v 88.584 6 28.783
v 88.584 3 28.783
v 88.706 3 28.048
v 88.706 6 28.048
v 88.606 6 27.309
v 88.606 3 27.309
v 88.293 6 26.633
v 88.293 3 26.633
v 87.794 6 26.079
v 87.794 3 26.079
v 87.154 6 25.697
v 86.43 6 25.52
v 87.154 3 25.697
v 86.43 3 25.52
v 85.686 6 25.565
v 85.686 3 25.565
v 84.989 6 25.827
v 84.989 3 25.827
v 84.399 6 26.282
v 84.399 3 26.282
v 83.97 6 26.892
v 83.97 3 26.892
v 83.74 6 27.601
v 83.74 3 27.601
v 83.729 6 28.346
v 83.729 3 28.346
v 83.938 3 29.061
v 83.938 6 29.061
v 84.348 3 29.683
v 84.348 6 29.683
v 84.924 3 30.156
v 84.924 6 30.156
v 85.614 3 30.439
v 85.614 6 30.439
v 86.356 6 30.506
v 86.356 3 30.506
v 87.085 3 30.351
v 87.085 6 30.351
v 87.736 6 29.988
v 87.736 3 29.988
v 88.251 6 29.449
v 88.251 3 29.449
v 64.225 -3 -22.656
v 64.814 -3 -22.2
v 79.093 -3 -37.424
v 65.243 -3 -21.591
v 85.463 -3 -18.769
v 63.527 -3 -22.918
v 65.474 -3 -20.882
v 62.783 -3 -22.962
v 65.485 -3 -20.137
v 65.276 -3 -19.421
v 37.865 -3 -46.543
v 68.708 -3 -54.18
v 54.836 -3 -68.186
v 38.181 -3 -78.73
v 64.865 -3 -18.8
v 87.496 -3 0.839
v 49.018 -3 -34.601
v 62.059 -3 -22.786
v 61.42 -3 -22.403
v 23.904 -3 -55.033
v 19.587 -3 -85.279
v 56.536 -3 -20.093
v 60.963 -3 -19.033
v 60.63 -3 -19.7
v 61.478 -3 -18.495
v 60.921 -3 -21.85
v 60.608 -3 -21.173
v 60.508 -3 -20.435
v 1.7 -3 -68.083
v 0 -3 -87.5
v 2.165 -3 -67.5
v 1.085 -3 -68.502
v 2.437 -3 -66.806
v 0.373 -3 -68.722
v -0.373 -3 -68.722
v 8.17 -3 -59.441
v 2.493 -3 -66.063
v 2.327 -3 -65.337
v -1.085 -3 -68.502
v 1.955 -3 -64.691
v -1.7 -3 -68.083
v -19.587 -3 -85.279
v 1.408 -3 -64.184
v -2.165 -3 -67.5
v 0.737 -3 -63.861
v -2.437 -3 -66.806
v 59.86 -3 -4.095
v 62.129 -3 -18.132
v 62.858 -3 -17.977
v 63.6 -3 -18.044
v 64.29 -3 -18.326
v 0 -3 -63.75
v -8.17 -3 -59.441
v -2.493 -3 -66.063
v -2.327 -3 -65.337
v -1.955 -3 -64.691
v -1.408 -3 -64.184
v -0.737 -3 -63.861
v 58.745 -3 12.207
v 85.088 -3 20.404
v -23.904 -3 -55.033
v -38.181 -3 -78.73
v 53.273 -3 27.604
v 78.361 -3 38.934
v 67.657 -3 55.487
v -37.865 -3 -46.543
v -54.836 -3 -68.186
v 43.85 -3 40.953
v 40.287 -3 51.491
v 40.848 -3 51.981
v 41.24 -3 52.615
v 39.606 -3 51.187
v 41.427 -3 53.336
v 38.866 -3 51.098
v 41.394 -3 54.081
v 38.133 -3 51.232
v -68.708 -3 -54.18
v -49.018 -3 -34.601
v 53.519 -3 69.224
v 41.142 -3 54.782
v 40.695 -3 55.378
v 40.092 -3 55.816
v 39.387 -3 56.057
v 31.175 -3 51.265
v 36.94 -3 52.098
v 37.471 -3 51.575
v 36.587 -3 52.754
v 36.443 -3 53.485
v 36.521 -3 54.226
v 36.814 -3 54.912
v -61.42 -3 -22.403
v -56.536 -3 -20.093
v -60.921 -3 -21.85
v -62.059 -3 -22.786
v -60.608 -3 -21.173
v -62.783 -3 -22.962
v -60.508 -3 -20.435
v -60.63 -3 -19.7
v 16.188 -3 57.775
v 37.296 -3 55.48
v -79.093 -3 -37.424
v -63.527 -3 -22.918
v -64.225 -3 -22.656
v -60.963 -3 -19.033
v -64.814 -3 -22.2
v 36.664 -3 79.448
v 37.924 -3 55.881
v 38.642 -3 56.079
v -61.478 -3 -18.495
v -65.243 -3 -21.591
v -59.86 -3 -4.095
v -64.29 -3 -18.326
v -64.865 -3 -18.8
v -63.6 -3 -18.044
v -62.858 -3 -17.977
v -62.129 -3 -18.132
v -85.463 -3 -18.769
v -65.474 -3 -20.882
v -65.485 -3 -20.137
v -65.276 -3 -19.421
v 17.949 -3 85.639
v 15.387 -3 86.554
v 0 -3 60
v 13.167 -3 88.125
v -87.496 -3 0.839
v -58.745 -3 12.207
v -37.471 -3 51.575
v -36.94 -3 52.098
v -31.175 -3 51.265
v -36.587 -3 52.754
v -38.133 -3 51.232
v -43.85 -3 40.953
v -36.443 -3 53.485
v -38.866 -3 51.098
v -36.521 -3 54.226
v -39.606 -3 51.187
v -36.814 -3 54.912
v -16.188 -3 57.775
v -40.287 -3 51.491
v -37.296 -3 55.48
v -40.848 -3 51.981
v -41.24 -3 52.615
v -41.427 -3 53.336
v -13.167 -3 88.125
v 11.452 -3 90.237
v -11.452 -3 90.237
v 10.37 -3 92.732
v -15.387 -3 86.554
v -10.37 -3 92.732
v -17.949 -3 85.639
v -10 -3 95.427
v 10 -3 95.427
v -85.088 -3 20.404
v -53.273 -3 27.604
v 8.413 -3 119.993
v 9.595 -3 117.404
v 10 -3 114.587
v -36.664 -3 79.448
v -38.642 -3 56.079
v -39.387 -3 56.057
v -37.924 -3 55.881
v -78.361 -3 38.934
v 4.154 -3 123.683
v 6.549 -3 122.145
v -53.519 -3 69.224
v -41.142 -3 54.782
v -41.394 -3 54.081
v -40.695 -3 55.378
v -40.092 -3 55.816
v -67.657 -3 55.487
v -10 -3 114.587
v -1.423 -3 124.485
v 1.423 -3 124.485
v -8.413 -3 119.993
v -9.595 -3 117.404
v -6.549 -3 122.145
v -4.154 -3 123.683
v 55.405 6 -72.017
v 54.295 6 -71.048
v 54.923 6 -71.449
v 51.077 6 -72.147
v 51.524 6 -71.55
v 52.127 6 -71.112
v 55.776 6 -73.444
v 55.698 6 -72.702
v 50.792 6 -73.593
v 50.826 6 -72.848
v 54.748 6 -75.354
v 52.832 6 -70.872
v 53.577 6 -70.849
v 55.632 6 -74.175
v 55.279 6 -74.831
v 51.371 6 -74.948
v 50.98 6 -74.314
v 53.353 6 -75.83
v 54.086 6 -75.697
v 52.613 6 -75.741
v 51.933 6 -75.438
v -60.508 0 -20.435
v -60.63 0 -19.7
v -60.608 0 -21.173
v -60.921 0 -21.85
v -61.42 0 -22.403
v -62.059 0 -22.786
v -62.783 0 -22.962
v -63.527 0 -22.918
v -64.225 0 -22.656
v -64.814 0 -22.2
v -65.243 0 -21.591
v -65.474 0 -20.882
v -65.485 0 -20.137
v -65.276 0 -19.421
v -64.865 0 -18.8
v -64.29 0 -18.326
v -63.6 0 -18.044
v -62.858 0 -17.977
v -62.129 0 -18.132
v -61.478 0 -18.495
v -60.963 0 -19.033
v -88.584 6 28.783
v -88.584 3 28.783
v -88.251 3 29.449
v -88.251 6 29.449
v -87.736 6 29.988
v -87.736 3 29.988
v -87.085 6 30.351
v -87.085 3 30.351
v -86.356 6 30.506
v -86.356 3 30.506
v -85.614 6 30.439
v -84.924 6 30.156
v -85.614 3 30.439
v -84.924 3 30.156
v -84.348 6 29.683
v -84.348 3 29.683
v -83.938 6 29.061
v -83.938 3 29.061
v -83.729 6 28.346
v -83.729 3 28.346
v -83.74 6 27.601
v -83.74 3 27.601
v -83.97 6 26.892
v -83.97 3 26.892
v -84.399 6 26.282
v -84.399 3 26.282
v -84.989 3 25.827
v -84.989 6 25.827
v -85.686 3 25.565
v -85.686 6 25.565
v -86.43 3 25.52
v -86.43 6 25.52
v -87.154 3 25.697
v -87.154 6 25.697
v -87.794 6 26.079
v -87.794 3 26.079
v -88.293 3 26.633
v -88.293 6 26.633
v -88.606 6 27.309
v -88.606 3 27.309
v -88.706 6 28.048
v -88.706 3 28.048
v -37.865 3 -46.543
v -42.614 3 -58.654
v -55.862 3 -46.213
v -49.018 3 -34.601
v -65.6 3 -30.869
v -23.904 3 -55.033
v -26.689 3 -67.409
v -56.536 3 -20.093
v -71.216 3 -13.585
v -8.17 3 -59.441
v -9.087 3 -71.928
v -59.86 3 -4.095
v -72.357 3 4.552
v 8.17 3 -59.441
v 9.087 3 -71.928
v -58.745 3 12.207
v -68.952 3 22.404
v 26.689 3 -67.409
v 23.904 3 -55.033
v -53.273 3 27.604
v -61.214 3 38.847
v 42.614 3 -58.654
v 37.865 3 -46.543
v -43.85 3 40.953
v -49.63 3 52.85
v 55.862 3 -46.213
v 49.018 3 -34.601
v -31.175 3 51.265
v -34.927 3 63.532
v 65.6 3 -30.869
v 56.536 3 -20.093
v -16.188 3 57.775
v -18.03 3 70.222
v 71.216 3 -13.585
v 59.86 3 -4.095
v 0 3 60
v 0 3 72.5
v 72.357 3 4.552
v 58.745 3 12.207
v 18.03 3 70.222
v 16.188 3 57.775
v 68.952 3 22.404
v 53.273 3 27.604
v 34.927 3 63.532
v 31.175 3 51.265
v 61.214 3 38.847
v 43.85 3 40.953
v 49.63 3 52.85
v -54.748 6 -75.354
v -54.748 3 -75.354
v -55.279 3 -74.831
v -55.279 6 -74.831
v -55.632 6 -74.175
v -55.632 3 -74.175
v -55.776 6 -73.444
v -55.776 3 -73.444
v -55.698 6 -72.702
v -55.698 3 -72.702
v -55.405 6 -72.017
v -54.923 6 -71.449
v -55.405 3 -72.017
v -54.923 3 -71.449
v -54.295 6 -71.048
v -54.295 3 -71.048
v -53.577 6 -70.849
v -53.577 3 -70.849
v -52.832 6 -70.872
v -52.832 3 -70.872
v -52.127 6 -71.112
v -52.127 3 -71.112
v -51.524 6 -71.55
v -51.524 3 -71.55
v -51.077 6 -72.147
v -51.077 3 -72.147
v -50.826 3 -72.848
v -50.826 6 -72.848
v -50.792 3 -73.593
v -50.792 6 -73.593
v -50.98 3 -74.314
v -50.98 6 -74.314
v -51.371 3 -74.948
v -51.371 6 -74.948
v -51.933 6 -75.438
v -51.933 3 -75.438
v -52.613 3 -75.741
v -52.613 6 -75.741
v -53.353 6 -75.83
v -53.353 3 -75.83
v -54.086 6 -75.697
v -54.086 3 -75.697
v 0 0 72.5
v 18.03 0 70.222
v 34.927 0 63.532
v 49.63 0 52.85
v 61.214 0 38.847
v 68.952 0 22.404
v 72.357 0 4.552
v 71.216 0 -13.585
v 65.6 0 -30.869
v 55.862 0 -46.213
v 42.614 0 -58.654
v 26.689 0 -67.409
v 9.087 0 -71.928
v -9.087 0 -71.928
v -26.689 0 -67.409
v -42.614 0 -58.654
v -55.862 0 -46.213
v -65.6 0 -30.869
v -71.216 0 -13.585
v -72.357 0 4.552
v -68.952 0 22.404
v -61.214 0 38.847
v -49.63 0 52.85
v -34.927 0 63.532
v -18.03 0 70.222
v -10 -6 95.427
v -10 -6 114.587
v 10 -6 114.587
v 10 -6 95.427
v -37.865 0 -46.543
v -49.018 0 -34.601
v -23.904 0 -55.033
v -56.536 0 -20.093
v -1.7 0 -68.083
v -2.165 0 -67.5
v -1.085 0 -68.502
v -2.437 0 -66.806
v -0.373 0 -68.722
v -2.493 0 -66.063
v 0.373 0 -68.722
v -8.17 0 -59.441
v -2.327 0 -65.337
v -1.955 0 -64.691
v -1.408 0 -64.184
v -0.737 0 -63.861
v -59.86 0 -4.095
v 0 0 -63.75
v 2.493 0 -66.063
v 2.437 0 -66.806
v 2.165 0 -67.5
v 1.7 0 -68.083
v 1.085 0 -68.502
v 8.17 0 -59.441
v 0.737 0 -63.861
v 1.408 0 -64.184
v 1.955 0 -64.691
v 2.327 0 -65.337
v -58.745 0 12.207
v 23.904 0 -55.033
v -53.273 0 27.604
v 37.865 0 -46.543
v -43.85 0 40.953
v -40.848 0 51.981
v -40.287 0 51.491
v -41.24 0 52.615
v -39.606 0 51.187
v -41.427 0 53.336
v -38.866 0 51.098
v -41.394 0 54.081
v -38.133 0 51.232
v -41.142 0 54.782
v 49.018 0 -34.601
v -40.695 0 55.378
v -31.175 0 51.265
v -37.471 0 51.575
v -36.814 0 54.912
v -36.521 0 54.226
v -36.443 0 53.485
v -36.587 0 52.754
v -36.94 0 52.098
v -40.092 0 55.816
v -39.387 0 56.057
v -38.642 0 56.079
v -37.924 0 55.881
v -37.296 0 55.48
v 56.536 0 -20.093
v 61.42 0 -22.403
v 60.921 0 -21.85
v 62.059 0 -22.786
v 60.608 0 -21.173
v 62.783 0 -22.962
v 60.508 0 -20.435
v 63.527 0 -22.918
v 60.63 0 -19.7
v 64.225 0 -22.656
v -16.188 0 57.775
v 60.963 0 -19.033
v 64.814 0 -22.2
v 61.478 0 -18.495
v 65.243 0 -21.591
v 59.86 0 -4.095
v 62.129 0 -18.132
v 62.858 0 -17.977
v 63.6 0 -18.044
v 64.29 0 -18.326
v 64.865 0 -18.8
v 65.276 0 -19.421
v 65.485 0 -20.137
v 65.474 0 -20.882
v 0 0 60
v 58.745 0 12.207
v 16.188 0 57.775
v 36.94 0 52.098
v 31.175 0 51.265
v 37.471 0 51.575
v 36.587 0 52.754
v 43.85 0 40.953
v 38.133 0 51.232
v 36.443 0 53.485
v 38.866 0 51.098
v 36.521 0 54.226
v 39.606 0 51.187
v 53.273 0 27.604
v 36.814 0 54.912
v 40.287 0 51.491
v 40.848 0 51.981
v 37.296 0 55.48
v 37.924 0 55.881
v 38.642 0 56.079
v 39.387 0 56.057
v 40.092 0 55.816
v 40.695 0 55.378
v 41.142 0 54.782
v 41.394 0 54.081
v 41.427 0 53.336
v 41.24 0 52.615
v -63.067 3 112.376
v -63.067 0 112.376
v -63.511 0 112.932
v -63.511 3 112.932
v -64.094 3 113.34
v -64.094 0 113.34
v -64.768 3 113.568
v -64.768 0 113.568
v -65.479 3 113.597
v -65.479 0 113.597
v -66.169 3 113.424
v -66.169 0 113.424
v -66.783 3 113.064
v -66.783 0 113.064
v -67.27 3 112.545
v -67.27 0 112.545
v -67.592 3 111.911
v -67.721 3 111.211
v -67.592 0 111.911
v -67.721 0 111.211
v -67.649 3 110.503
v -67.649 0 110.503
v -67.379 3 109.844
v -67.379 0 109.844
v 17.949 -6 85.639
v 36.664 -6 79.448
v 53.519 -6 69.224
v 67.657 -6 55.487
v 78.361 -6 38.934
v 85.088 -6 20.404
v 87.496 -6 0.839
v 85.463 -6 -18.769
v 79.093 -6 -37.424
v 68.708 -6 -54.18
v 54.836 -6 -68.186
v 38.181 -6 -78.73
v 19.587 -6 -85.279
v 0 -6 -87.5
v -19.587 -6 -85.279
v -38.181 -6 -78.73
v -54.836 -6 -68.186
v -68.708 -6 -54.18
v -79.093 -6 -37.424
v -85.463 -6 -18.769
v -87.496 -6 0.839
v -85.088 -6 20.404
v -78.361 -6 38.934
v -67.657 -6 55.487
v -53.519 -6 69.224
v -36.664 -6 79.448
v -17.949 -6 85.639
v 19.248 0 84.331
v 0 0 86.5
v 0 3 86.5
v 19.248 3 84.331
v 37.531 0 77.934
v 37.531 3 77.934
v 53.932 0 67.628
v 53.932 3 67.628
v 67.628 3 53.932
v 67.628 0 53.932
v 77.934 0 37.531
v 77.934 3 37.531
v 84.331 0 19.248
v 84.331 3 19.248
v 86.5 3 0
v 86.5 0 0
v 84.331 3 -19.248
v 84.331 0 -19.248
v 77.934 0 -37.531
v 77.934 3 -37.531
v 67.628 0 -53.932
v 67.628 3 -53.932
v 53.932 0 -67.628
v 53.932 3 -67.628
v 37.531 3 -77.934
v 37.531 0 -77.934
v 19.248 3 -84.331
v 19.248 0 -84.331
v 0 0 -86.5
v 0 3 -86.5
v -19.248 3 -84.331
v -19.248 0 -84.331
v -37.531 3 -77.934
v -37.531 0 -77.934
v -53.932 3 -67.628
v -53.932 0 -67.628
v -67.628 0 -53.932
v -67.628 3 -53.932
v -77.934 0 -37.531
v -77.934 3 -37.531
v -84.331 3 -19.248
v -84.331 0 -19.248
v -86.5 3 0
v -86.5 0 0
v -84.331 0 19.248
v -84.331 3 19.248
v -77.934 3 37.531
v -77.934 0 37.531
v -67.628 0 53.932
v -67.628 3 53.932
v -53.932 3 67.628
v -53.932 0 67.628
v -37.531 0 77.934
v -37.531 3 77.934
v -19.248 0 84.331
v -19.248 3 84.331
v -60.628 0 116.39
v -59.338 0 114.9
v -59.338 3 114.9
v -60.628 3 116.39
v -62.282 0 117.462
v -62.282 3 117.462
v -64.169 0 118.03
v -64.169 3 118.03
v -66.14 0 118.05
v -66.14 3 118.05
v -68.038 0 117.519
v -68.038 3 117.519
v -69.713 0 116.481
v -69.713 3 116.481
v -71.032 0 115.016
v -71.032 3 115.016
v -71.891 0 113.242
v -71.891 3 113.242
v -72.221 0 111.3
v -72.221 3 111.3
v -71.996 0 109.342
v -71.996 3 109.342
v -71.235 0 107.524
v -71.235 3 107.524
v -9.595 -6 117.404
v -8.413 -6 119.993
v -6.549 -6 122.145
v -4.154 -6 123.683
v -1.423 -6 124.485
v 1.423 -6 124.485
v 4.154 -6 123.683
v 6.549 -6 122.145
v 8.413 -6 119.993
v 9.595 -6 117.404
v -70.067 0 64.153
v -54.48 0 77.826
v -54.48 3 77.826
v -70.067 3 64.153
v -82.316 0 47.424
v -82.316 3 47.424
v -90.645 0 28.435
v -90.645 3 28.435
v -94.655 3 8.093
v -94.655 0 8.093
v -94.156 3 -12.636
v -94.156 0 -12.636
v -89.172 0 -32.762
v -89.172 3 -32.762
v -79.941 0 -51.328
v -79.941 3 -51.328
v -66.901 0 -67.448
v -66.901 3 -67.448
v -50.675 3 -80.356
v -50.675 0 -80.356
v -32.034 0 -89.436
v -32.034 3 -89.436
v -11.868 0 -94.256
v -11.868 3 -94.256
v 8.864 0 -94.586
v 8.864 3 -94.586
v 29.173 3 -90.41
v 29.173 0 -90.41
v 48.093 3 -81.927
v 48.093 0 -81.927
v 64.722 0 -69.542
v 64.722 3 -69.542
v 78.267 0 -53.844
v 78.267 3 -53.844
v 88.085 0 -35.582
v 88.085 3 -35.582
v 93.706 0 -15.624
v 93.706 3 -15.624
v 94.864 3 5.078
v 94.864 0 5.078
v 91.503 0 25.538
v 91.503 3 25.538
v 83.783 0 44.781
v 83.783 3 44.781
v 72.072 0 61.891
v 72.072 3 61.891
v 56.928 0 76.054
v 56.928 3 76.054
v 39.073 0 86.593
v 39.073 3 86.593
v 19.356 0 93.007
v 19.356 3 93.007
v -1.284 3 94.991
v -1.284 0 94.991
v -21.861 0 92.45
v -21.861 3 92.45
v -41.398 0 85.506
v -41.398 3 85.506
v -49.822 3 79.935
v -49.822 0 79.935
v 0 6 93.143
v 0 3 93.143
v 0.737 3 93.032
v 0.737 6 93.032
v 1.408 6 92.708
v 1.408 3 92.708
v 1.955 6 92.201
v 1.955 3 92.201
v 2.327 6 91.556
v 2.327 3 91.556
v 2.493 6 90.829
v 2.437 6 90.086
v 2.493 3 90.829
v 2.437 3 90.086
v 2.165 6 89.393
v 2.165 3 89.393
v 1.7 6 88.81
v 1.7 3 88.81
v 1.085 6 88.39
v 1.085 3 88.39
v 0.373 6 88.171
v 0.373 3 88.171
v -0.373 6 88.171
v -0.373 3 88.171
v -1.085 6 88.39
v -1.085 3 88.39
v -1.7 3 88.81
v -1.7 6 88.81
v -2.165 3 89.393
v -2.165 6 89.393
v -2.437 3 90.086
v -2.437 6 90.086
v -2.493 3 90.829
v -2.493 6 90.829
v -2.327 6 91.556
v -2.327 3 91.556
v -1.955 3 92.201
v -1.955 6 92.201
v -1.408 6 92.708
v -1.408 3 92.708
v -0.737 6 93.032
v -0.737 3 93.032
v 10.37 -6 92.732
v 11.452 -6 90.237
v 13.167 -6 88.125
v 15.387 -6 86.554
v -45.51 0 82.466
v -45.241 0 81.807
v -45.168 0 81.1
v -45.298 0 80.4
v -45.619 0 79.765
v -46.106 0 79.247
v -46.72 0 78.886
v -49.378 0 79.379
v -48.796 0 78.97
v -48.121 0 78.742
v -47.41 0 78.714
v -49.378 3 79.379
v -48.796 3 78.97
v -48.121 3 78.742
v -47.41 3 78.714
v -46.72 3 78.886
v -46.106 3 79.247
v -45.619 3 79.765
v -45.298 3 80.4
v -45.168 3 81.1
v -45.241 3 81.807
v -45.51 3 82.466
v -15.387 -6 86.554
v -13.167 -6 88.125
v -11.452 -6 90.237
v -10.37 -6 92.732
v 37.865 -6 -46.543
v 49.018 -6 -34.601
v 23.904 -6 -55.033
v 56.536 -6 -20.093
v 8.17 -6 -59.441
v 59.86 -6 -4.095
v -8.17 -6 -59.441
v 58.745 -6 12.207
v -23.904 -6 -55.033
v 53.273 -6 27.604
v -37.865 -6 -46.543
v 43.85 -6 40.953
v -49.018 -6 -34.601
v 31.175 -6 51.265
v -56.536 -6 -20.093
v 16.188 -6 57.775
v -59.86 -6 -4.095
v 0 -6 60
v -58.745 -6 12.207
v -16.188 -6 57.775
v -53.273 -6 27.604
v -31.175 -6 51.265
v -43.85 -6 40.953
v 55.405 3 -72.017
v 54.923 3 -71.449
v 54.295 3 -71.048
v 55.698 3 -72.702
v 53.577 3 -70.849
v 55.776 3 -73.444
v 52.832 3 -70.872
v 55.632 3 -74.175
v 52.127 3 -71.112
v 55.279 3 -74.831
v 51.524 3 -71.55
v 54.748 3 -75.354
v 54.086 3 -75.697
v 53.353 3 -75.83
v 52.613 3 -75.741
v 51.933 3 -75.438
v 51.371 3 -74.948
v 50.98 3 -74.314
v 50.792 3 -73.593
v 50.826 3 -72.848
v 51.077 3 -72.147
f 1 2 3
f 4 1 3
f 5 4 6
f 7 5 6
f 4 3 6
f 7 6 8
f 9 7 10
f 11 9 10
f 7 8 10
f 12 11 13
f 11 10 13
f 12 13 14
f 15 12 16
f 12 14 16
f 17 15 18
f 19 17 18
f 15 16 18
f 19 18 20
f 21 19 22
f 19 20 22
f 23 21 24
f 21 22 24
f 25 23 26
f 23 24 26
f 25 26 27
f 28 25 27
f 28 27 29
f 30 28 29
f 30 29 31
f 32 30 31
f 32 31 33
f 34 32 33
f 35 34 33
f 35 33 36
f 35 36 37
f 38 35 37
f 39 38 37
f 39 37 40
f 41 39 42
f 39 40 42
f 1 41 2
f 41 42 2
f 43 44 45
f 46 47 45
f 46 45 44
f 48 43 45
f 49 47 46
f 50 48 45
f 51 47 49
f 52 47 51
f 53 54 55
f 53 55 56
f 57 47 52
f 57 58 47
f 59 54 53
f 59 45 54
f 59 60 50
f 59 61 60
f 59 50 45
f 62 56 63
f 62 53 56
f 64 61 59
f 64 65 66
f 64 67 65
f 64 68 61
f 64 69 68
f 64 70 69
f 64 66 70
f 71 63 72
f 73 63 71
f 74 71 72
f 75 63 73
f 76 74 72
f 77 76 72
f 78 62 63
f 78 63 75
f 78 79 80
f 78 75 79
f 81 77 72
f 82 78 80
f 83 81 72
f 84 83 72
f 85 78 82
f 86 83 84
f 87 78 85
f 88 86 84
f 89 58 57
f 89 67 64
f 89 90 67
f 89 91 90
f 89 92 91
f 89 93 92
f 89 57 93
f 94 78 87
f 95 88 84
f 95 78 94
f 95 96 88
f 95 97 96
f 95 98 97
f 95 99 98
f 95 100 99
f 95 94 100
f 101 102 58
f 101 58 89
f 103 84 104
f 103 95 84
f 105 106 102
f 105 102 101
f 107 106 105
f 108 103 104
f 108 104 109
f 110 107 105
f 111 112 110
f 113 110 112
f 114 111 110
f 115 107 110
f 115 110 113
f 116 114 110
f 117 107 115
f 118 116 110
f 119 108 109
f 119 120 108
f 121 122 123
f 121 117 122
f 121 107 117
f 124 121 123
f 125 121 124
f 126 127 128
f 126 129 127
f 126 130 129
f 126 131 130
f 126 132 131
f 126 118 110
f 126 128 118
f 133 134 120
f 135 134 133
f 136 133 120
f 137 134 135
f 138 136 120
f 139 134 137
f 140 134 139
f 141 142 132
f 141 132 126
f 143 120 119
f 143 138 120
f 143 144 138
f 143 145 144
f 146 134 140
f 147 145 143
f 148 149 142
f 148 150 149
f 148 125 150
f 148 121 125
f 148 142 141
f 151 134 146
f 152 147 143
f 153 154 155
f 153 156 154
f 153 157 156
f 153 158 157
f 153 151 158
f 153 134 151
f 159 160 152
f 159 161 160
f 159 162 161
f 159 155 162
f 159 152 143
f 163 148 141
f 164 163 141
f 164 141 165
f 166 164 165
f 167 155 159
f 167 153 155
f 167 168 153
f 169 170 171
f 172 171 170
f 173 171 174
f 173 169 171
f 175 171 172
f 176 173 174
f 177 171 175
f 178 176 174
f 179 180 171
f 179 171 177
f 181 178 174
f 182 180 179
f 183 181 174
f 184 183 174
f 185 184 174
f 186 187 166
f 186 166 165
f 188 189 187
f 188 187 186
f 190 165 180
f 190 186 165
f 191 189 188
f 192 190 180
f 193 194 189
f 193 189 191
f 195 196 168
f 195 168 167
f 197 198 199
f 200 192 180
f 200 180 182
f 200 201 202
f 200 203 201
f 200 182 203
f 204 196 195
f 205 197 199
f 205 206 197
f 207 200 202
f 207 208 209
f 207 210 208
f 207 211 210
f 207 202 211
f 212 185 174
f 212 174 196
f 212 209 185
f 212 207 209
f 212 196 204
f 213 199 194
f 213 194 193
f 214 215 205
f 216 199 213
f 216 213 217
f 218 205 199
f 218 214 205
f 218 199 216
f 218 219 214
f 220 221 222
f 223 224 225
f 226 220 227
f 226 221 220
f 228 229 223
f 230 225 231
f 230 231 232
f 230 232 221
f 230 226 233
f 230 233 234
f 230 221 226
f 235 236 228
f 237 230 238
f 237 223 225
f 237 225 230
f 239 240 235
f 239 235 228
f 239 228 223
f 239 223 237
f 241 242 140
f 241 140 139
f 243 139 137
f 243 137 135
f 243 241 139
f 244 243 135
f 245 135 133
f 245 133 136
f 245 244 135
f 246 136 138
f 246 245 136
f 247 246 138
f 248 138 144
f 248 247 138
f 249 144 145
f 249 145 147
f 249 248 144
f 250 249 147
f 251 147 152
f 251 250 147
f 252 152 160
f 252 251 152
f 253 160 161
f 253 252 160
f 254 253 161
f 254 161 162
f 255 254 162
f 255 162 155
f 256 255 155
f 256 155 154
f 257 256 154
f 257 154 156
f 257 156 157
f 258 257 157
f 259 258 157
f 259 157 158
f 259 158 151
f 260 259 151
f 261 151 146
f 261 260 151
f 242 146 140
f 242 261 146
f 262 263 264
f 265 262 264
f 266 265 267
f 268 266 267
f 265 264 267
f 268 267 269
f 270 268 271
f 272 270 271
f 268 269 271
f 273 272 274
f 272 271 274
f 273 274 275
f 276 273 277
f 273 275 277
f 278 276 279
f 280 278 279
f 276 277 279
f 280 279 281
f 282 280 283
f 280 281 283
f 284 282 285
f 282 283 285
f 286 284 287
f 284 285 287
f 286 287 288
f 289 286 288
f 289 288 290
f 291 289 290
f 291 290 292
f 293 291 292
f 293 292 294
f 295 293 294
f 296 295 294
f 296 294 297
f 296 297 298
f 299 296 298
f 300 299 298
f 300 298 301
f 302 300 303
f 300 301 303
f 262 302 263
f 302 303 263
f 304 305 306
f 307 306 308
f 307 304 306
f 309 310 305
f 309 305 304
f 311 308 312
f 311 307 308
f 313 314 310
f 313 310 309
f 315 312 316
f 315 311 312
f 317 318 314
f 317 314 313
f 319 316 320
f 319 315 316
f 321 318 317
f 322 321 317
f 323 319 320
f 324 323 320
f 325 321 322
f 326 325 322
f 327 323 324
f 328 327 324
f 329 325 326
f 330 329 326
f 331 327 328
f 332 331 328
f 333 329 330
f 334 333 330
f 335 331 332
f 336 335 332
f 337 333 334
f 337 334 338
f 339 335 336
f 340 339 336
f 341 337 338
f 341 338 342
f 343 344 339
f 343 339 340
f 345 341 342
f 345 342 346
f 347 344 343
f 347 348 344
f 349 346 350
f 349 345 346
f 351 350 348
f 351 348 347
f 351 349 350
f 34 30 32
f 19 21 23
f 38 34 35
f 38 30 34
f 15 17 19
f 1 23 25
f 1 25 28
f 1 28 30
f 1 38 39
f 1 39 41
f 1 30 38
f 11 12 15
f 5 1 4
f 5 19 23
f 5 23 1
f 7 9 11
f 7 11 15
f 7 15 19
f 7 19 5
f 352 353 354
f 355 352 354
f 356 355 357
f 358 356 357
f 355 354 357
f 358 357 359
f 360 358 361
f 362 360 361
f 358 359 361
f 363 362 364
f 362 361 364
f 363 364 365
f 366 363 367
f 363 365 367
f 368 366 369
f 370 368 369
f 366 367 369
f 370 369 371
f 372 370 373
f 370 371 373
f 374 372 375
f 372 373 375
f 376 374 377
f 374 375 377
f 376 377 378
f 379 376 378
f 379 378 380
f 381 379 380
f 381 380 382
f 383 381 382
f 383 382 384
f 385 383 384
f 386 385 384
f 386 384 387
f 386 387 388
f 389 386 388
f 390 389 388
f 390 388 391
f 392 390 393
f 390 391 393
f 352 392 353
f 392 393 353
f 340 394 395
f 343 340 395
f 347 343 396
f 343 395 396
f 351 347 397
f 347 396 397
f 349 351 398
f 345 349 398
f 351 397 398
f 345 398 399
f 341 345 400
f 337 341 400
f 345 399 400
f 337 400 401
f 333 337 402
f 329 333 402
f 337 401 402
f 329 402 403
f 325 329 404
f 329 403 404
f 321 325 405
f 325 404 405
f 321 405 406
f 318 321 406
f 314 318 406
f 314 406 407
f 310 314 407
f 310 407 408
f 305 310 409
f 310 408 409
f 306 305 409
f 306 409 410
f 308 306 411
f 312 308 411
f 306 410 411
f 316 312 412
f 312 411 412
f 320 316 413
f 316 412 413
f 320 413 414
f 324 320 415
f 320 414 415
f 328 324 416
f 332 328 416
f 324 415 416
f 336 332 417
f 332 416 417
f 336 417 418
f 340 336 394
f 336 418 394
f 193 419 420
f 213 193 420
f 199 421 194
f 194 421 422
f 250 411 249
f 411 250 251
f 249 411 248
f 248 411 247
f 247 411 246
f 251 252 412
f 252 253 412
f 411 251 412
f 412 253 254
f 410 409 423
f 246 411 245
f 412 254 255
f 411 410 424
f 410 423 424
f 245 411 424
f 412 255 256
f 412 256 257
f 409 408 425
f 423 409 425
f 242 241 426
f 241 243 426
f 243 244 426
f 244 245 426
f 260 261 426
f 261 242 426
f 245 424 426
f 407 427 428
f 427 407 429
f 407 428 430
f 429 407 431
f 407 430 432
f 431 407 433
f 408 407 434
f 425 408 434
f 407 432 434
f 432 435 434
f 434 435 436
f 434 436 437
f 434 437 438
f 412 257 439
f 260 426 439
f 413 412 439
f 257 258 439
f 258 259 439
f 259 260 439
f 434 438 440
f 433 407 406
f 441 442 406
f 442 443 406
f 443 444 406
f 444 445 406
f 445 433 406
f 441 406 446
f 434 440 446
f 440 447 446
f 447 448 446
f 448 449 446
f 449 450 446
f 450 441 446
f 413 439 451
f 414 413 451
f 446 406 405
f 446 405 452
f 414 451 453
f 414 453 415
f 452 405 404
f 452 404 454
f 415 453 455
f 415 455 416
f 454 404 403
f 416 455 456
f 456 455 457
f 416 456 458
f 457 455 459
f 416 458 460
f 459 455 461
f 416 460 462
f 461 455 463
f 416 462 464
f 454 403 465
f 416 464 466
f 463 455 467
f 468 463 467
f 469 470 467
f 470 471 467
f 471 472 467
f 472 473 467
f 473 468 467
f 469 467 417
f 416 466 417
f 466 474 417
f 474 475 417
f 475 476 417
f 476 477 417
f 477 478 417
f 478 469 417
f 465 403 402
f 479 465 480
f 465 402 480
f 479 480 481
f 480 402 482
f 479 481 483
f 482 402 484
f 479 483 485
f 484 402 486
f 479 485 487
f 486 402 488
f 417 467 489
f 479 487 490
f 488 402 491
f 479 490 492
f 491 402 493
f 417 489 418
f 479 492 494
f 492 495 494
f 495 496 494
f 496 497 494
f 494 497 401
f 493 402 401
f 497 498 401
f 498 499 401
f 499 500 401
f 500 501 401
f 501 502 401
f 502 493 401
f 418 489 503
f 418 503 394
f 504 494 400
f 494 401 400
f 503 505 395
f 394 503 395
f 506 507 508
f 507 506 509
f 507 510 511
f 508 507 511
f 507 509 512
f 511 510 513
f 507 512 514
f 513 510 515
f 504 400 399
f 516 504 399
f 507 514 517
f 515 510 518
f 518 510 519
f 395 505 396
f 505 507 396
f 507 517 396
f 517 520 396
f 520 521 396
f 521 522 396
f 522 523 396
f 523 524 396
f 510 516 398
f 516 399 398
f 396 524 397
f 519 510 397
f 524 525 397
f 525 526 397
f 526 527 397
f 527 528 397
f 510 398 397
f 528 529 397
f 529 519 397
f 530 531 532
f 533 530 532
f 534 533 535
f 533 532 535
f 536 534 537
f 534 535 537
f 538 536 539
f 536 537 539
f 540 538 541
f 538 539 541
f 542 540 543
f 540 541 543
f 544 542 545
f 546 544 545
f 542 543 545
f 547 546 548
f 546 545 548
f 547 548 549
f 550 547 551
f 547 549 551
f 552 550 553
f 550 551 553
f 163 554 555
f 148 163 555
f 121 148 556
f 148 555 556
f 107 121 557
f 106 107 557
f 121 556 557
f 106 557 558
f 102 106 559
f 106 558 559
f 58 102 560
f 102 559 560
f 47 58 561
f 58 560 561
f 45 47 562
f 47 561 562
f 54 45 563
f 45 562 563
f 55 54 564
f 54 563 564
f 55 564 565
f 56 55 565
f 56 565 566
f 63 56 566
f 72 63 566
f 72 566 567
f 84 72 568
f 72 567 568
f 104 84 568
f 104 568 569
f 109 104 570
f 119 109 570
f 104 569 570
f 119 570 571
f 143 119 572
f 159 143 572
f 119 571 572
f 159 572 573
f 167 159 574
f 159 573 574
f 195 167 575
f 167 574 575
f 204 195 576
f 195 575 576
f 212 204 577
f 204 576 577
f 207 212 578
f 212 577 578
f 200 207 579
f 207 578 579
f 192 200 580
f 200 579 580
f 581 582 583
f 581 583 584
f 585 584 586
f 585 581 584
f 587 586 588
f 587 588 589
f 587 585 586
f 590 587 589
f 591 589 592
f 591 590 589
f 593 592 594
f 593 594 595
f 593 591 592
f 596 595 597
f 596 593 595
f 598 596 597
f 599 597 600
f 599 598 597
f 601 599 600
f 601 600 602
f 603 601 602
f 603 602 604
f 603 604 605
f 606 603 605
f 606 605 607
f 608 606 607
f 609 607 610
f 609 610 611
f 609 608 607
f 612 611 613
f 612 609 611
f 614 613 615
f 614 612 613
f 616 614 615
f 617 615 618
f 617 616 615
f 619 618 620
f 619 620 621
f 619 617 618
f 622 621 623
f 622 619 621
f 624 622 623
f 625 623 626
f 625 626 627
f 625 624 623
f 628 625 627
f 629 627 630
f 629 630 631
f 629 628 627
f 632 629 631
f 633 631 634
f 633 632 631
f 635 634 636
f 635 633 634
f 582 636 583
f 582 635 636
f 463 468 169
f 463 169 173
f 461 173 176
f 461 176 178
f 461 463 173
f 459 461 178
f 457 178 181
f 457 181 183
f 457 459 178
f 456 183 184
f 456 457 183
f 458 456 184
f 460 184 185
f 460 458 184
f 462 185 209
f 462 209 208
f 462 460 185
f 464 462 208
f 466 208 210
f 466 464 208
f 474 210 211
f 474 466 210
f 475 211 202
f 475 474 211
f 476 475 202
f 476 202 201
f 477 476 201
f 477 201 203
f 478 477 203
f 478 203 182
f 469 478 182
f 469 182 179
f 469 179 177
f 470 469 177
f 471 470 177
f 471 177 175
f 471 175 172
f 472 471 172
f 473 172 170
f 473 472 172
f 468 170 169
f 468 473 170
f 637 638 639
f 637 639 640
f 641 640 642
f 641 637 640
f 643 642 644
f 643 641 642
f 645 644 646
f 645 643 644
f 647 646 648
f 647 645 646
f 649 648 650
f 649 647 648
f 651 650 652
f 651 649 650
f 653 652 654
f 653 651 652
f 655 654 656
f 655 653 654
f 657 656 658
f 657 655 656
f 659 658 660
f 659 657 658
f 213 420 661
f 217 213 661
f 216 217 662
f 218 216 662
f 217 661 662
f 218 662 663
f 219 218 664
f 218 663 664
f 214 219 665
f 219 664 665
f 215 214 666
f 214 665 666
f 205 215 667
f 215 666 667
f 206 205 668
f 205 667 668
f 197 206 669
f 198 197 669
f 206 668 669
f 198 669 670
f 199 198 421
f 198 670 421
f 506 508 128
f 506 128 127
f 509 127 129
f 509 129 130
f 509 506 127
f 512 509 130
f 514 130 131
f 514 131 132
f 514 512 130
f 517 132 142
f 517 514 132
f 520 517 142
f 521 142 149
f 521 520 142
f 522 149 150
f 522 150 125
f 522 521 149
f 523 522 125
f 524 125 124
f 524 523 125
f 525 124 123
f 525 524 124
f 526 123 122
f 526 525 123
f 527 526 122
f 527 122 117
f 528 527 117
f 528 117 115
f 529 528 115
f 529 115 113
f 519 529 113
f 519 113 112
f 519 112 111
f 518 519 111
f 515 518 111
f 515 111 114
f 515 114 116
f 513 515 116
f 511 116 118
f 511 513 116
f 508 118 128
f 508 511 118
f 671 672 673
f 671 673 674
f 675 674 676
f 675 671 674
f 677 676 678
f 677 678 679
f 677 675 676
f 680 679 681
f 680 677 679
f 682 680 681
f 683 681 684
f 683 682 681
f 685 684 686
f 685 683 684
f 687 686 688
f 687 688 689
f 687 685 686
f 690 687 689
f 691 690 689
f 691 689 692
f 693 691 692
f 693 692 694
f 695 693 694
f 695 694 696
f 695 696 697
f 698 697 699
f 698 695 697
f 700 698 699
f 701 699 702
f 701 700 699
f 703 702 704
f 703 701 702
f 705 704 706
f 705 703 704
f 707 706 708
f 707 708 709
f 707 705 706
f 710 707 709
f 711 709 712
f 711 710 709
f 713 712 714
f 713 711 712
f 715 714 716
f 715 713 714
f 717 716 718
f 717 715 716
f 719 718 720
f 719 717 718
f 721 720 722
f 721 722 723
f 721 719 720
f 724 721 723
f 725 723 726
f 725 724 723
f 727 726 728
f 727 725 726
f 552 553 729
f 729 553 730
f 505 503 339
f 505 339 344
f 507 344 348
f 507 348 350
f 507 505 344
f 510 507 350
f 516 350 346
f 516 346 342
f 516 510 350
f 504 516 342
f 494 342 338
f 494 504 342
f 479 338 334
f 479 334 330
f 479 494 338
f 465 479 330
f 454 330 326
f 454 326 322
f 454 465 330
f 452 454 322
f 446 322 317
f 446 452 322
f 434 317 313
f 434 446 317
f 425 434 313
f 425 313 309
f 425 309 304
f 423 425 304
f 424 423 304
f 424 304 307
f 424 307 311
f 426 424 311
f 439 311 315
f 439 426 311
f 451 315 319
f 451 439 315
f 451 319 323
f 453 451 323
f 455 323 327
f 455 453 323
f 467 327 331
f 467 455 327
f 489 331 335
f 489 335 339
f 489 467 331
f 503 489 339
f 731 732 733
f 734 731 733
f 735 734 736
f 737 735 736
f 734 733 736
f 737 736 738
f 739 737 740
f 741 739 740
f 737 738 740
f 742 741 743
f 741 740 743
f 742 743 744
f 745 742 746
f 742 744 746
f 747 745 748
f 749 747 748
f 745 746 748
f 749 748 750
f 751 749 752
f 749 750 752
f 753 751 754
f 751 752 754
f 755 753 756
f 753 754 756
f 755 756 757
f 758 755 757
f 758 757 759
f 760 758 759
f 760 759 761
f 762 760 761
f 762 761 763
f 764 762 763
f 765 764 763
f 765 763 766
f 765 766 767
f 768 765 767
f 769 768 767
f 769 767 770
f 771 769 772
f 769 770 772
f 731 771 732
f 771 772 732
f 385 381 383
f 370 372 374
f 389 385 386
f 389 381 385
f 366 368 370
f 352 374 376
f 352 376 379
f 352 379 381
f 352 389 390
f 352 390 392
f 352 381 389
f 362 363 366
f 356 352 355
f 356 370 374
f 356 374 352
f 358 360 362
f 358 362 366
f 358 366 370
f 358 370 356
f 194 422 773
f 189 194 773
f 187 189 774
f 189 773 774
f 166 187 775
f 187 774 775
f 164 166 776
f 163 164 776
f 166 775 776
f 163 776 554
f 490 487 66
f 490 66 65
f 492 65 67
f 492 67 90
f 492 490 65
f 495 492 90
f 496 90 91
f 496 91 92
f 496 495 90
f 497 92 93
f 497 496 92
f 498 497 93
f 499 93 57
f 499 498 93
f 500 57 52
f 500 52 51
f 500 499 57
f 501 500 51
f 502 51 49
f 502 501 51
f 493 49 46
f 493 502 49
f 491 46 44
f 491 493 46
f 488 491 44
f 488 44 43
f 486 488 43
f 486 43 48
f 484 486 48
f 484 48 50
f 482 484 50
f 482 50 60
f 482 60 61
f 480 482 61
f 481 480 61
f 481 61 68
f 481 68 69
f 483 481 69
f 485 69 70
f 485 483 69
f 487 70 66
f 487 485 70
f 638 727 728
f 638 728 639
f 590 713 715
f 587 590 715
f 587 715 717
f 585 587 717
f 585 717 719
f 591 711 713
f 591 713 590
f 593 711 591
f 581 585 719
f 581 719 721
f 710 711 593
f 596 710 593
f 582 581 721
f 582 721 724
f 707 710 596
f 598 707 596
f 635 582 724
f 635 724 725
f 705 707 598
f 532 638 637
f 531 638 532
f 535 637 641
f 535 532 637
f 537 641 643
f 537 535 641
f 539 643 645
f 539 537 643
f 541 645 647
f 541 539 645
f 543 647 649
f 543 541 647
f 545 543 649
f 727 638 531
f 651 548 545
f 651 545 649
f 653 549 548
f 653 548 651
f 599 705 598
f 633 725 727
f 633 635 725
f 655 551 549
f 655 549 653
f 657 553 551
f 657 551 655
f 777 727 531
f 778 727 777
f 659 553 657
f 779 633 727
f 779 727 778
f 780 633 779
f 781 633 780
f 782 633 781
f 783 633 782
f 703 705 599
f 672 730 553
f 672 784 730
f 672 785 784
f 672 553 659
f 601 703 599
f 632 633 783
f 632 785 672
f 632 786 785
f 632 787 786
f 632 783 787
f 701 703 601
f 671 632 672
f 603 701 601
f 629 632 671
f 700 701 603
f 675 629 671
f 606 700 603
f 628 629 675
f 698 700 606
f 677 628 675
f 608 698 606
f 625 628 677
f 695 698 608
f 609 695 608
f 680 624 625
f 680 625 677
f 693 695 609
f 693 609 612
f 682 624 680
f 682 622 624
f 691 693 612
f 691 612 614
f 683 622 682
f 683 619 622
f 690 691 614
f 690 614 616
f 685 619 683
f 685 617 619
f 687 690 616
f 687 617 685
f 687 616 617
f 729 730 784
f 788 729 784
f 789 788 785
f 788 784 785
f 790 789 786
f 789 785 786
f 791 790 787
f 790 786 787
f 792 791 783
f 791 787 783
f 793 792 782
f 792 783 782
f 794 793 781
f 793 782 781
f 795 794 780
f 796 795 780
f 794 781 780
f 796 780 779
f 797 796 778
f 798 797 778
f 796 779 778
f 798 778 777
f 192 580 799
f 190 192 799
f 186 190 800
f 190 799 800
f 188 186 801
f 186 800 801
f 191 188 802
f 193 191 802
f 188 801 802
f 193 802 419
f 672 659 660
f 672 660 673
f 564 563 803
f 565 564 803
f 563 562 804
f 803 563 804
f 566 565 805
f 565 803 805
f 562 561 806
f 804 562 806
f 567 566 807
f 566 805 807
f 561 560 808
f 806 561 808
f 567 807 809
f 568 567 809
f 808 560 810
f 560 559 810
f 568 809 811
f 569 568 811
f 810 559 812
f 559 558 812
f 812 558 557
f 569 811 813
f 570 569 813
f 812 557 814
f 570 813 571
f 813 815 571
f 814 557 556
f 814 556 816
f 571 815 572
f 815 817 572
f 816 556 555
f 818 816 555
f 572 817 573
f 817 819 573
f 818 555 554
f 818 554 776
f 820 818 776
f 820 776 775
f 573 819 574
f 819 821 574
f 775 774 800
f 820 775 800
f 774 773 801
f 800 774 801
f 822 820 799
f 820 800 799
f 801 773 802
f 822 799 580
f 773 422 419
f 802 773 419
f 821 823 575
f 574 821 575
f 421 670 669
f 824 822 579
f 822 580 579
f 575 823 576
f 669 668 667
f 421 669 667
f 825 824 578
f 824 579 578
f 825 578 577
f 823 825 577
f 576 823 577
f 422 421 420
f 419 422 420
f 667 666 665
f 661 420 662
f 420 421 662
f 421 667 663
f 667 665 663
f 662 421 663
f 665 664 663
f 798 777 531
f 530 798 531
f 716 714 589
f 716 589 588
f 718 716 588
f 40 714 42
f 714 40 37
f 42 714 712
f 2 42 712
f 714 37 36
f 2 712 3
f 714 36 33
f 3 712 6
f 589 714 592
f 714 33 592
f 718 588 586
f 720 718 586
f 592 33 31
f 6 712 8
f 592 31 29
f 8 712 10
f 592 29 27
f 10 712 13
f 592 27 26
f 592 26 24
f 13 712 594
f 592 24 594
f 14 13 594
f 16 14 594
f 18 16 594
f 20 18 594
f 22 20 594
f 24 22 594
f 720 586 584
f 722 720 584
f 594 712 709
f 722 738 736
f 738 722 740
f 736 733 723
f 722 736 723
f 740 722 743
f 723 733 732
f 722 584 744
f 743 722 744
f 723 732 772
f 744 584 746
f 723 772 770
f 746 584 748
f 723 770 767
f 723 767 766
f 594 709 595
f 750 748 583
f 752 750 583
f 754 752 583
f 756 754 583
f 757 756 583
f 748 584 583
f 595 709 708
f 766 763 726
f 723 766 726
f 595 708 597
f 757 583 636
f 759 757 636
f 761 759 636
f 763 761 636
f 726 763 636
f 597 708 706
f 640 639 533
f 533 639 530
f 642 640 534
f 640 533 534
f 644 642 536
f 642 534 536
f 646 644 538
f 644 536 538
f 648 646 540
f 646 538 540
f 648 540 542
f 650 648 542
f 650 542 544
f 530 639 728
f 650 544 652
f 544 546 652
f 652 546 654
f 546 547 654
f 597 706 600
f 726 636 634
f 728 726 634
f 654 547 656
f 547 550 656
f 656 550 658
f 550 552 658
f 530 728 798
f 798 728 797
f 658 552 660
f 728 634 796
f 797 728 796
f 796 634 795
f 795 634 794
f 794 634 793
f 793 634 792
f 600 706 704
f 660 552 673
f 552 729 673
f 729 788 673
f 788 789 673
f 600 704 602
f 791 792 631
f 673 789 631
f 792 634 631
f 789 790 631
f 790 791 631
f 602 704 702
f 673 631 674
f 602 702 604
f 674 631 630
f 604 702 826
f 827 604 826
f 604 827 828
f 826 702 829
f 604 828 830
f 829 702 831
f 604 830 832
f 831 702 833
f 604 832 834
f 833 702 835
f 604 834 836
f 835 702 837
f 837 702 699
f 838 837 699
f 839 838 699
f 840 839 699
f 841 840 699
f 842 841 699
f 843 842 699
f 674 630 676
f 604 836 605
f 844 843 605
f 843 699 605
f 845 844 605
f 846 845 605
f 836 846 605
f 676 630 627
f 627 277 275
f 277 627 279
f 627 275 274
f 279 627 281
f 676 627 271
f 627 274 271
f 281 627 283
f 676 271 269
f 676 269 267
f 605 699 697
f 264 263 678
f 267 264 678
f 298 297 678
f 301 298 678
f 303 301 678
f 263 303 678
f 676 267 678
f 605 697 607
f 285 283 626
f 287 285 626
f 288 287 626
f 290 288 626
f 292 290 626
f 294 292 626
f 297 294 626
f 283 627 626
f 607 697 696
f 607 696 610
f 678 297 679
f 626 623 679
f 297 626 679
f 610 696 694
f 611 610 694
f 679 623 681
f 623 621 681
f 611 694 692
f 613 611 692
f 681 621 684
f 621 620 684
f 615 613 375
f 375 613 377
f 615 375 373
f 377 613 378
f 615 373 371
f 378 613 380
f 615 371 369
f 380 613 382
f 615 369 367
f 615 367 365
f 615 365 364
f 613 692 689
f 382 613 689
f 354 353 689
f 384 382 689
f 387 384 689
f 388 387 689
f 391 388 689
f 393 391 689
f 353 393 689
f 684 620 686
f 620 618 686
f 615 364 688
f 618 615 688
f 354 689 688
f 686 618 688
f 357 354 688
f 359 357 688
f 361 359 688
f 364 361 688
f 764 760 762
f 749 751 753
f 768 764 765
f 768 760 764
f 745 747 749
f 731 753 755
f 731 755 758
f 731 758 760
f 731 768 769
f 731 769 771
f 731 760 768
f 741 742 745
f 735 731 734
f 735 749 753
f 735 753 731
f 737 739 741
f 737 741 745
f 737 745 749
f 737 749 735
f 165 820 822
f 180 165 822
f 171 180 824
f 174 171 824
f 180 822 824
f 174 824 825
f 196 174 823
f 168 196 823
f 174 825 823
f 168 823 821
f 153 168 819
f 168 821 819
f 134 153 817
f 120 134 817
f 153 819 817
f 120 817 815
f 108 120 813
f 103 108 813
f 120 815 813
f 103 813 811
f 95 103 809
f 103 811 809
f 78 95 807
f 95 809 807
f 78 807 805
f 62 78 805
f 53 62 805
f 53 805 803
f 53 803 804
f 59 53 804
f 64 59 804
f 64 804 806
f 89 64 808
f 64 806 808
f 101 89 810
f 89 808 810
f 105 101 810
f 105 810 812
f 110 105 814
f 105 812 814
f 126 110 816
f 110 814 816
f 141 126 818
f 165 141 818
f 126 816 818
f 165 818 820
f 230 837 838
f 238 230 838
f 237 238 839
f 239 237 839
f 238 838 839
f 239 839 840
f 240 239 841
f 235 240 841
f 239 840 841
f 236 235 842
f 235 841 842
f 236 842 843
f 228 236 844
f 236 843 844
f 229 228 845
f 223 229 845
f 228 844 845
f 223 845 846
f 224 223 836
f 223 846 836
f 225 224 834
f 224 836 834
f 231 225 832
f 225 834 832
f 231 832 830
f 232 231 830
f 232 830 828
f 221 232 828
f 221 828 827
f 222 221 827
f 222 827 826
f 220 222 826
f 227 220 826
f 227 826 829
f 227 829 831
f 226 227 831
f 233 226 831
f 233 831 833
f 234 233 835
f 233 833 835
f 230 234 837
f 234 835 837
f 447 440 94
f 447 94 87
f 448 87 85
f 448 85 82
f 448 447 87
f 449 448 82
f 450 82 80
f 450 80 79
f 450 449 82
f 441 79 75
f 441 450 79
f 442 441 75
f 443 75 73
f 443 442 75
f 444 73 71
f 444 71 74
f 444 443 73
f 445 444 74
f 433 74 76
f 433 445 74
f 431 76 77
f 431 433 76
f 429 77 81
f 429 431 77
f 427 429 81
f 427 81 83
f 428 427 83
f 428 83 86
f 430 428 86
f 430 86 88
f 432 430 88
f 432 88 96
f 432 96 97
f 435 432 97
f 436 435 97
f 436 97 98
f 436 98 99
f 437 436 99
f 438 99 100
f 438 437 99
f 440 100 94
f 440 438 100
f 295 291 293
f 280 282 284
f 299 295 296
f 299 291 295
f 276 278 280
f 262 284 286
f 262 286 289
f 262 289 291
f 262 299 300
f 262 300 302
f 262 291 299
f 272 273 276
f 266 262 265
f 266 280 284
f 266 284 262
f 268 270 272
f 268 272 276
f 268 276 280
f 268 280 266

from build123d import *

# Parameters (mm, degrees)
SKETCH_1_R               = 72.5
SKETCH_1_R_2             = 60
EXTRUDE_1_DEPTH          = 3
SKETCH_2_R               = 2.5
EXTRUDE_2_DEPTH          = 3
PATTERN_CIRCULAR_1_COUNT = 5
EXTRUDE_START            = 3
SKETCH_3_R               = 60
EXTRUDE_3_DEPTH          = 3
SKETCH_4_R               = 86.5
EXTRUDE_4_DEPTH          = 3
SKETCH_7_R               = 2.5
EXTRUDE_7_DEPTH          = 3
PATTERN_CIRCULAR_5_COUNT = 5
CUT_EXTRUDE_1_DEPTH      = 3


with BuildPart() as part:
    # 草图1 → 凸台-拉伸1 (new body)
    with BuildSketch(Plane(origin=(0, 0, 0), x_dir=(1, 0, 0), z_dir=(0, 1, 0))):
        with Locations(Location((0, 0, 0), (0, 0, 270))):
            Circle(SKETCH_1_R)
        with Locations(Location((0, 0, 0), (0, 0, 270))):
            Circle(SKETCH_1_R_2, mode=Mode.SUBTRACT)
    extrude(amount=EXTRUDE_1_DEPTH)

    # 草图2 → 凸台-拉伸2 (add)
    with BuildSketch(Plane(origin=(0, 0, 0), x_dir=(1, 0, 0), z_dir=(0, 1, 0))):
        with Locations(Location((0, 66.25, 0), (0, 0, 270))):
            Circle(SKETCH_2_R)
    extrude_2 = extrude(amount=-EXTRUDE_2_DEPTH)

    # 阵列(圆周)1: 凸台-拉伸2 ×5 about axis
    pattern_circular_1_axis = Axis((0, 0, 0), (0, 1, 0))
    for i in range(1, PATTERN_CIRCULAR_1_COUNT):
        add(extrude_2.rotate(pattern_circular_1_axis, i * 360 / PATTERN_CIRCULAR_1_COUNT))

    # 草图3 → 凸台-拉伸3 (add)
    with BuildSketch(Plane.XZ.offset(3).offset(EXTRUDE_START)):
        with BuildLine():
            Line((10, 114.58706304), (10, 95.42667342))
            ThreePointArc((10, 95.42667342), (12.237499742, 89.1224217), (17.948717949, 85.6393223))
            ThreePointArc((17.948717949, 85.6393223), (0, -87.5), (-17.948717949, 85.6393223))
            ThreePointArc((-17.948717949, 85.6393223), (-12.237499742, 89.1224217), (-10, 95.42667342))
            Line((-10, 95.42667342), (-10, 114.58706304))
            ThreePointArc((-10, 114.58706304), (0, 124.58706304), (10, 114.58706304))
        make_face()
        with Locations(Location((0, 0, 0), (0, 0, 90))):
            Circle(SKETCH_3_R, mode=Mode.SUBTRACT)
    extrude(amount=-EXTRUDE_3_DEPTH)


with BuildPart() as body_2:
    # 草图4 → 凸台-拉伸4 (new body)
    with BuildSketch(Plane(origin=(0, 0, 0), x_dir=(1, 0, 0), z_dir=(0, 1, 0))):
        with BuildLine():
            Line((-71.235028952, -107.523774466), (-54.480369424, -77.826019733))
            ThreePointArc((-54.480369424, -77.826019733), (48.092738476, 81.927336743), (-41.398046023, -85.505565816))
            Line((-41.398046023, -85.505565816), (-59.338433855, -114.90031295))
            ThreePointArc((-59.338433855, -114.90031295), (-68.912249243, -117.059138228), (-71.235028952, -107.523774466))
        make_face()
        with Locations(Location((0, 0, 0), (0, 0, 270))):
            Circle(SKETCH_4_R, mode=Mode.SUBTRACT)
    extrude(amount=EXTRUDE_4_DEPTH)

    # 草图7 → 凸台-拉伸7 (add)
    with BuildSketch(Plane(origin=(0, 3, 0), x_dir=(1, 0, 0), z_dir=(0, 1, 0))):
        with Locations(Location((0, -90.642629317, 0), (0, 0, 270))):
            Circle(SKETCH_7_R)
    extrude_7 = extrude(amount=EXTRUDE_7_DEPTH)

    # 阵列(圆周)5: 凸台-拉伸7 ×5 about axis
    pattern_circular_5_axis = Axis((0, 0, 0), (0, 1, 0))
    for i in range(1, PATTERN_CIRCULAR_5_COUNT):
        add(extrude_7.rotate(pattern_circular_5_axis, i * 360 / PATTERN_CIRCULAR_5_COUNT))

    # 草图9 → 切除-拉伸1 (cut)
    with BuildSketch(Plane(origin=(0, 0, 0), x_dir=(1, 0, 0), z_dir=(0, 1, 0))):
        with BuildLine():
            Line((-67.379419488, -109.844366475), (-49.822016323, -79.934834869))
            ThreePointArc((-49.822016323, -79.934834869), (-46.400435396, -79.044450705), (-45.510051231, -82.466031631))
            Line((-45.510051231, -82.466031631), (-63.067454396, -112.375563237))
            ThreePointArc((-63.067454396, -112.375563237), (-66.489035323, -113.265947402), (-67.379419488, -109.844366475))
        make_face()
    extrude(amount=CUT_EXTRUDE_1_DEPTH, mode=Mode.SUBTRACT)


solid = Compound([part.part, body_2.part])
